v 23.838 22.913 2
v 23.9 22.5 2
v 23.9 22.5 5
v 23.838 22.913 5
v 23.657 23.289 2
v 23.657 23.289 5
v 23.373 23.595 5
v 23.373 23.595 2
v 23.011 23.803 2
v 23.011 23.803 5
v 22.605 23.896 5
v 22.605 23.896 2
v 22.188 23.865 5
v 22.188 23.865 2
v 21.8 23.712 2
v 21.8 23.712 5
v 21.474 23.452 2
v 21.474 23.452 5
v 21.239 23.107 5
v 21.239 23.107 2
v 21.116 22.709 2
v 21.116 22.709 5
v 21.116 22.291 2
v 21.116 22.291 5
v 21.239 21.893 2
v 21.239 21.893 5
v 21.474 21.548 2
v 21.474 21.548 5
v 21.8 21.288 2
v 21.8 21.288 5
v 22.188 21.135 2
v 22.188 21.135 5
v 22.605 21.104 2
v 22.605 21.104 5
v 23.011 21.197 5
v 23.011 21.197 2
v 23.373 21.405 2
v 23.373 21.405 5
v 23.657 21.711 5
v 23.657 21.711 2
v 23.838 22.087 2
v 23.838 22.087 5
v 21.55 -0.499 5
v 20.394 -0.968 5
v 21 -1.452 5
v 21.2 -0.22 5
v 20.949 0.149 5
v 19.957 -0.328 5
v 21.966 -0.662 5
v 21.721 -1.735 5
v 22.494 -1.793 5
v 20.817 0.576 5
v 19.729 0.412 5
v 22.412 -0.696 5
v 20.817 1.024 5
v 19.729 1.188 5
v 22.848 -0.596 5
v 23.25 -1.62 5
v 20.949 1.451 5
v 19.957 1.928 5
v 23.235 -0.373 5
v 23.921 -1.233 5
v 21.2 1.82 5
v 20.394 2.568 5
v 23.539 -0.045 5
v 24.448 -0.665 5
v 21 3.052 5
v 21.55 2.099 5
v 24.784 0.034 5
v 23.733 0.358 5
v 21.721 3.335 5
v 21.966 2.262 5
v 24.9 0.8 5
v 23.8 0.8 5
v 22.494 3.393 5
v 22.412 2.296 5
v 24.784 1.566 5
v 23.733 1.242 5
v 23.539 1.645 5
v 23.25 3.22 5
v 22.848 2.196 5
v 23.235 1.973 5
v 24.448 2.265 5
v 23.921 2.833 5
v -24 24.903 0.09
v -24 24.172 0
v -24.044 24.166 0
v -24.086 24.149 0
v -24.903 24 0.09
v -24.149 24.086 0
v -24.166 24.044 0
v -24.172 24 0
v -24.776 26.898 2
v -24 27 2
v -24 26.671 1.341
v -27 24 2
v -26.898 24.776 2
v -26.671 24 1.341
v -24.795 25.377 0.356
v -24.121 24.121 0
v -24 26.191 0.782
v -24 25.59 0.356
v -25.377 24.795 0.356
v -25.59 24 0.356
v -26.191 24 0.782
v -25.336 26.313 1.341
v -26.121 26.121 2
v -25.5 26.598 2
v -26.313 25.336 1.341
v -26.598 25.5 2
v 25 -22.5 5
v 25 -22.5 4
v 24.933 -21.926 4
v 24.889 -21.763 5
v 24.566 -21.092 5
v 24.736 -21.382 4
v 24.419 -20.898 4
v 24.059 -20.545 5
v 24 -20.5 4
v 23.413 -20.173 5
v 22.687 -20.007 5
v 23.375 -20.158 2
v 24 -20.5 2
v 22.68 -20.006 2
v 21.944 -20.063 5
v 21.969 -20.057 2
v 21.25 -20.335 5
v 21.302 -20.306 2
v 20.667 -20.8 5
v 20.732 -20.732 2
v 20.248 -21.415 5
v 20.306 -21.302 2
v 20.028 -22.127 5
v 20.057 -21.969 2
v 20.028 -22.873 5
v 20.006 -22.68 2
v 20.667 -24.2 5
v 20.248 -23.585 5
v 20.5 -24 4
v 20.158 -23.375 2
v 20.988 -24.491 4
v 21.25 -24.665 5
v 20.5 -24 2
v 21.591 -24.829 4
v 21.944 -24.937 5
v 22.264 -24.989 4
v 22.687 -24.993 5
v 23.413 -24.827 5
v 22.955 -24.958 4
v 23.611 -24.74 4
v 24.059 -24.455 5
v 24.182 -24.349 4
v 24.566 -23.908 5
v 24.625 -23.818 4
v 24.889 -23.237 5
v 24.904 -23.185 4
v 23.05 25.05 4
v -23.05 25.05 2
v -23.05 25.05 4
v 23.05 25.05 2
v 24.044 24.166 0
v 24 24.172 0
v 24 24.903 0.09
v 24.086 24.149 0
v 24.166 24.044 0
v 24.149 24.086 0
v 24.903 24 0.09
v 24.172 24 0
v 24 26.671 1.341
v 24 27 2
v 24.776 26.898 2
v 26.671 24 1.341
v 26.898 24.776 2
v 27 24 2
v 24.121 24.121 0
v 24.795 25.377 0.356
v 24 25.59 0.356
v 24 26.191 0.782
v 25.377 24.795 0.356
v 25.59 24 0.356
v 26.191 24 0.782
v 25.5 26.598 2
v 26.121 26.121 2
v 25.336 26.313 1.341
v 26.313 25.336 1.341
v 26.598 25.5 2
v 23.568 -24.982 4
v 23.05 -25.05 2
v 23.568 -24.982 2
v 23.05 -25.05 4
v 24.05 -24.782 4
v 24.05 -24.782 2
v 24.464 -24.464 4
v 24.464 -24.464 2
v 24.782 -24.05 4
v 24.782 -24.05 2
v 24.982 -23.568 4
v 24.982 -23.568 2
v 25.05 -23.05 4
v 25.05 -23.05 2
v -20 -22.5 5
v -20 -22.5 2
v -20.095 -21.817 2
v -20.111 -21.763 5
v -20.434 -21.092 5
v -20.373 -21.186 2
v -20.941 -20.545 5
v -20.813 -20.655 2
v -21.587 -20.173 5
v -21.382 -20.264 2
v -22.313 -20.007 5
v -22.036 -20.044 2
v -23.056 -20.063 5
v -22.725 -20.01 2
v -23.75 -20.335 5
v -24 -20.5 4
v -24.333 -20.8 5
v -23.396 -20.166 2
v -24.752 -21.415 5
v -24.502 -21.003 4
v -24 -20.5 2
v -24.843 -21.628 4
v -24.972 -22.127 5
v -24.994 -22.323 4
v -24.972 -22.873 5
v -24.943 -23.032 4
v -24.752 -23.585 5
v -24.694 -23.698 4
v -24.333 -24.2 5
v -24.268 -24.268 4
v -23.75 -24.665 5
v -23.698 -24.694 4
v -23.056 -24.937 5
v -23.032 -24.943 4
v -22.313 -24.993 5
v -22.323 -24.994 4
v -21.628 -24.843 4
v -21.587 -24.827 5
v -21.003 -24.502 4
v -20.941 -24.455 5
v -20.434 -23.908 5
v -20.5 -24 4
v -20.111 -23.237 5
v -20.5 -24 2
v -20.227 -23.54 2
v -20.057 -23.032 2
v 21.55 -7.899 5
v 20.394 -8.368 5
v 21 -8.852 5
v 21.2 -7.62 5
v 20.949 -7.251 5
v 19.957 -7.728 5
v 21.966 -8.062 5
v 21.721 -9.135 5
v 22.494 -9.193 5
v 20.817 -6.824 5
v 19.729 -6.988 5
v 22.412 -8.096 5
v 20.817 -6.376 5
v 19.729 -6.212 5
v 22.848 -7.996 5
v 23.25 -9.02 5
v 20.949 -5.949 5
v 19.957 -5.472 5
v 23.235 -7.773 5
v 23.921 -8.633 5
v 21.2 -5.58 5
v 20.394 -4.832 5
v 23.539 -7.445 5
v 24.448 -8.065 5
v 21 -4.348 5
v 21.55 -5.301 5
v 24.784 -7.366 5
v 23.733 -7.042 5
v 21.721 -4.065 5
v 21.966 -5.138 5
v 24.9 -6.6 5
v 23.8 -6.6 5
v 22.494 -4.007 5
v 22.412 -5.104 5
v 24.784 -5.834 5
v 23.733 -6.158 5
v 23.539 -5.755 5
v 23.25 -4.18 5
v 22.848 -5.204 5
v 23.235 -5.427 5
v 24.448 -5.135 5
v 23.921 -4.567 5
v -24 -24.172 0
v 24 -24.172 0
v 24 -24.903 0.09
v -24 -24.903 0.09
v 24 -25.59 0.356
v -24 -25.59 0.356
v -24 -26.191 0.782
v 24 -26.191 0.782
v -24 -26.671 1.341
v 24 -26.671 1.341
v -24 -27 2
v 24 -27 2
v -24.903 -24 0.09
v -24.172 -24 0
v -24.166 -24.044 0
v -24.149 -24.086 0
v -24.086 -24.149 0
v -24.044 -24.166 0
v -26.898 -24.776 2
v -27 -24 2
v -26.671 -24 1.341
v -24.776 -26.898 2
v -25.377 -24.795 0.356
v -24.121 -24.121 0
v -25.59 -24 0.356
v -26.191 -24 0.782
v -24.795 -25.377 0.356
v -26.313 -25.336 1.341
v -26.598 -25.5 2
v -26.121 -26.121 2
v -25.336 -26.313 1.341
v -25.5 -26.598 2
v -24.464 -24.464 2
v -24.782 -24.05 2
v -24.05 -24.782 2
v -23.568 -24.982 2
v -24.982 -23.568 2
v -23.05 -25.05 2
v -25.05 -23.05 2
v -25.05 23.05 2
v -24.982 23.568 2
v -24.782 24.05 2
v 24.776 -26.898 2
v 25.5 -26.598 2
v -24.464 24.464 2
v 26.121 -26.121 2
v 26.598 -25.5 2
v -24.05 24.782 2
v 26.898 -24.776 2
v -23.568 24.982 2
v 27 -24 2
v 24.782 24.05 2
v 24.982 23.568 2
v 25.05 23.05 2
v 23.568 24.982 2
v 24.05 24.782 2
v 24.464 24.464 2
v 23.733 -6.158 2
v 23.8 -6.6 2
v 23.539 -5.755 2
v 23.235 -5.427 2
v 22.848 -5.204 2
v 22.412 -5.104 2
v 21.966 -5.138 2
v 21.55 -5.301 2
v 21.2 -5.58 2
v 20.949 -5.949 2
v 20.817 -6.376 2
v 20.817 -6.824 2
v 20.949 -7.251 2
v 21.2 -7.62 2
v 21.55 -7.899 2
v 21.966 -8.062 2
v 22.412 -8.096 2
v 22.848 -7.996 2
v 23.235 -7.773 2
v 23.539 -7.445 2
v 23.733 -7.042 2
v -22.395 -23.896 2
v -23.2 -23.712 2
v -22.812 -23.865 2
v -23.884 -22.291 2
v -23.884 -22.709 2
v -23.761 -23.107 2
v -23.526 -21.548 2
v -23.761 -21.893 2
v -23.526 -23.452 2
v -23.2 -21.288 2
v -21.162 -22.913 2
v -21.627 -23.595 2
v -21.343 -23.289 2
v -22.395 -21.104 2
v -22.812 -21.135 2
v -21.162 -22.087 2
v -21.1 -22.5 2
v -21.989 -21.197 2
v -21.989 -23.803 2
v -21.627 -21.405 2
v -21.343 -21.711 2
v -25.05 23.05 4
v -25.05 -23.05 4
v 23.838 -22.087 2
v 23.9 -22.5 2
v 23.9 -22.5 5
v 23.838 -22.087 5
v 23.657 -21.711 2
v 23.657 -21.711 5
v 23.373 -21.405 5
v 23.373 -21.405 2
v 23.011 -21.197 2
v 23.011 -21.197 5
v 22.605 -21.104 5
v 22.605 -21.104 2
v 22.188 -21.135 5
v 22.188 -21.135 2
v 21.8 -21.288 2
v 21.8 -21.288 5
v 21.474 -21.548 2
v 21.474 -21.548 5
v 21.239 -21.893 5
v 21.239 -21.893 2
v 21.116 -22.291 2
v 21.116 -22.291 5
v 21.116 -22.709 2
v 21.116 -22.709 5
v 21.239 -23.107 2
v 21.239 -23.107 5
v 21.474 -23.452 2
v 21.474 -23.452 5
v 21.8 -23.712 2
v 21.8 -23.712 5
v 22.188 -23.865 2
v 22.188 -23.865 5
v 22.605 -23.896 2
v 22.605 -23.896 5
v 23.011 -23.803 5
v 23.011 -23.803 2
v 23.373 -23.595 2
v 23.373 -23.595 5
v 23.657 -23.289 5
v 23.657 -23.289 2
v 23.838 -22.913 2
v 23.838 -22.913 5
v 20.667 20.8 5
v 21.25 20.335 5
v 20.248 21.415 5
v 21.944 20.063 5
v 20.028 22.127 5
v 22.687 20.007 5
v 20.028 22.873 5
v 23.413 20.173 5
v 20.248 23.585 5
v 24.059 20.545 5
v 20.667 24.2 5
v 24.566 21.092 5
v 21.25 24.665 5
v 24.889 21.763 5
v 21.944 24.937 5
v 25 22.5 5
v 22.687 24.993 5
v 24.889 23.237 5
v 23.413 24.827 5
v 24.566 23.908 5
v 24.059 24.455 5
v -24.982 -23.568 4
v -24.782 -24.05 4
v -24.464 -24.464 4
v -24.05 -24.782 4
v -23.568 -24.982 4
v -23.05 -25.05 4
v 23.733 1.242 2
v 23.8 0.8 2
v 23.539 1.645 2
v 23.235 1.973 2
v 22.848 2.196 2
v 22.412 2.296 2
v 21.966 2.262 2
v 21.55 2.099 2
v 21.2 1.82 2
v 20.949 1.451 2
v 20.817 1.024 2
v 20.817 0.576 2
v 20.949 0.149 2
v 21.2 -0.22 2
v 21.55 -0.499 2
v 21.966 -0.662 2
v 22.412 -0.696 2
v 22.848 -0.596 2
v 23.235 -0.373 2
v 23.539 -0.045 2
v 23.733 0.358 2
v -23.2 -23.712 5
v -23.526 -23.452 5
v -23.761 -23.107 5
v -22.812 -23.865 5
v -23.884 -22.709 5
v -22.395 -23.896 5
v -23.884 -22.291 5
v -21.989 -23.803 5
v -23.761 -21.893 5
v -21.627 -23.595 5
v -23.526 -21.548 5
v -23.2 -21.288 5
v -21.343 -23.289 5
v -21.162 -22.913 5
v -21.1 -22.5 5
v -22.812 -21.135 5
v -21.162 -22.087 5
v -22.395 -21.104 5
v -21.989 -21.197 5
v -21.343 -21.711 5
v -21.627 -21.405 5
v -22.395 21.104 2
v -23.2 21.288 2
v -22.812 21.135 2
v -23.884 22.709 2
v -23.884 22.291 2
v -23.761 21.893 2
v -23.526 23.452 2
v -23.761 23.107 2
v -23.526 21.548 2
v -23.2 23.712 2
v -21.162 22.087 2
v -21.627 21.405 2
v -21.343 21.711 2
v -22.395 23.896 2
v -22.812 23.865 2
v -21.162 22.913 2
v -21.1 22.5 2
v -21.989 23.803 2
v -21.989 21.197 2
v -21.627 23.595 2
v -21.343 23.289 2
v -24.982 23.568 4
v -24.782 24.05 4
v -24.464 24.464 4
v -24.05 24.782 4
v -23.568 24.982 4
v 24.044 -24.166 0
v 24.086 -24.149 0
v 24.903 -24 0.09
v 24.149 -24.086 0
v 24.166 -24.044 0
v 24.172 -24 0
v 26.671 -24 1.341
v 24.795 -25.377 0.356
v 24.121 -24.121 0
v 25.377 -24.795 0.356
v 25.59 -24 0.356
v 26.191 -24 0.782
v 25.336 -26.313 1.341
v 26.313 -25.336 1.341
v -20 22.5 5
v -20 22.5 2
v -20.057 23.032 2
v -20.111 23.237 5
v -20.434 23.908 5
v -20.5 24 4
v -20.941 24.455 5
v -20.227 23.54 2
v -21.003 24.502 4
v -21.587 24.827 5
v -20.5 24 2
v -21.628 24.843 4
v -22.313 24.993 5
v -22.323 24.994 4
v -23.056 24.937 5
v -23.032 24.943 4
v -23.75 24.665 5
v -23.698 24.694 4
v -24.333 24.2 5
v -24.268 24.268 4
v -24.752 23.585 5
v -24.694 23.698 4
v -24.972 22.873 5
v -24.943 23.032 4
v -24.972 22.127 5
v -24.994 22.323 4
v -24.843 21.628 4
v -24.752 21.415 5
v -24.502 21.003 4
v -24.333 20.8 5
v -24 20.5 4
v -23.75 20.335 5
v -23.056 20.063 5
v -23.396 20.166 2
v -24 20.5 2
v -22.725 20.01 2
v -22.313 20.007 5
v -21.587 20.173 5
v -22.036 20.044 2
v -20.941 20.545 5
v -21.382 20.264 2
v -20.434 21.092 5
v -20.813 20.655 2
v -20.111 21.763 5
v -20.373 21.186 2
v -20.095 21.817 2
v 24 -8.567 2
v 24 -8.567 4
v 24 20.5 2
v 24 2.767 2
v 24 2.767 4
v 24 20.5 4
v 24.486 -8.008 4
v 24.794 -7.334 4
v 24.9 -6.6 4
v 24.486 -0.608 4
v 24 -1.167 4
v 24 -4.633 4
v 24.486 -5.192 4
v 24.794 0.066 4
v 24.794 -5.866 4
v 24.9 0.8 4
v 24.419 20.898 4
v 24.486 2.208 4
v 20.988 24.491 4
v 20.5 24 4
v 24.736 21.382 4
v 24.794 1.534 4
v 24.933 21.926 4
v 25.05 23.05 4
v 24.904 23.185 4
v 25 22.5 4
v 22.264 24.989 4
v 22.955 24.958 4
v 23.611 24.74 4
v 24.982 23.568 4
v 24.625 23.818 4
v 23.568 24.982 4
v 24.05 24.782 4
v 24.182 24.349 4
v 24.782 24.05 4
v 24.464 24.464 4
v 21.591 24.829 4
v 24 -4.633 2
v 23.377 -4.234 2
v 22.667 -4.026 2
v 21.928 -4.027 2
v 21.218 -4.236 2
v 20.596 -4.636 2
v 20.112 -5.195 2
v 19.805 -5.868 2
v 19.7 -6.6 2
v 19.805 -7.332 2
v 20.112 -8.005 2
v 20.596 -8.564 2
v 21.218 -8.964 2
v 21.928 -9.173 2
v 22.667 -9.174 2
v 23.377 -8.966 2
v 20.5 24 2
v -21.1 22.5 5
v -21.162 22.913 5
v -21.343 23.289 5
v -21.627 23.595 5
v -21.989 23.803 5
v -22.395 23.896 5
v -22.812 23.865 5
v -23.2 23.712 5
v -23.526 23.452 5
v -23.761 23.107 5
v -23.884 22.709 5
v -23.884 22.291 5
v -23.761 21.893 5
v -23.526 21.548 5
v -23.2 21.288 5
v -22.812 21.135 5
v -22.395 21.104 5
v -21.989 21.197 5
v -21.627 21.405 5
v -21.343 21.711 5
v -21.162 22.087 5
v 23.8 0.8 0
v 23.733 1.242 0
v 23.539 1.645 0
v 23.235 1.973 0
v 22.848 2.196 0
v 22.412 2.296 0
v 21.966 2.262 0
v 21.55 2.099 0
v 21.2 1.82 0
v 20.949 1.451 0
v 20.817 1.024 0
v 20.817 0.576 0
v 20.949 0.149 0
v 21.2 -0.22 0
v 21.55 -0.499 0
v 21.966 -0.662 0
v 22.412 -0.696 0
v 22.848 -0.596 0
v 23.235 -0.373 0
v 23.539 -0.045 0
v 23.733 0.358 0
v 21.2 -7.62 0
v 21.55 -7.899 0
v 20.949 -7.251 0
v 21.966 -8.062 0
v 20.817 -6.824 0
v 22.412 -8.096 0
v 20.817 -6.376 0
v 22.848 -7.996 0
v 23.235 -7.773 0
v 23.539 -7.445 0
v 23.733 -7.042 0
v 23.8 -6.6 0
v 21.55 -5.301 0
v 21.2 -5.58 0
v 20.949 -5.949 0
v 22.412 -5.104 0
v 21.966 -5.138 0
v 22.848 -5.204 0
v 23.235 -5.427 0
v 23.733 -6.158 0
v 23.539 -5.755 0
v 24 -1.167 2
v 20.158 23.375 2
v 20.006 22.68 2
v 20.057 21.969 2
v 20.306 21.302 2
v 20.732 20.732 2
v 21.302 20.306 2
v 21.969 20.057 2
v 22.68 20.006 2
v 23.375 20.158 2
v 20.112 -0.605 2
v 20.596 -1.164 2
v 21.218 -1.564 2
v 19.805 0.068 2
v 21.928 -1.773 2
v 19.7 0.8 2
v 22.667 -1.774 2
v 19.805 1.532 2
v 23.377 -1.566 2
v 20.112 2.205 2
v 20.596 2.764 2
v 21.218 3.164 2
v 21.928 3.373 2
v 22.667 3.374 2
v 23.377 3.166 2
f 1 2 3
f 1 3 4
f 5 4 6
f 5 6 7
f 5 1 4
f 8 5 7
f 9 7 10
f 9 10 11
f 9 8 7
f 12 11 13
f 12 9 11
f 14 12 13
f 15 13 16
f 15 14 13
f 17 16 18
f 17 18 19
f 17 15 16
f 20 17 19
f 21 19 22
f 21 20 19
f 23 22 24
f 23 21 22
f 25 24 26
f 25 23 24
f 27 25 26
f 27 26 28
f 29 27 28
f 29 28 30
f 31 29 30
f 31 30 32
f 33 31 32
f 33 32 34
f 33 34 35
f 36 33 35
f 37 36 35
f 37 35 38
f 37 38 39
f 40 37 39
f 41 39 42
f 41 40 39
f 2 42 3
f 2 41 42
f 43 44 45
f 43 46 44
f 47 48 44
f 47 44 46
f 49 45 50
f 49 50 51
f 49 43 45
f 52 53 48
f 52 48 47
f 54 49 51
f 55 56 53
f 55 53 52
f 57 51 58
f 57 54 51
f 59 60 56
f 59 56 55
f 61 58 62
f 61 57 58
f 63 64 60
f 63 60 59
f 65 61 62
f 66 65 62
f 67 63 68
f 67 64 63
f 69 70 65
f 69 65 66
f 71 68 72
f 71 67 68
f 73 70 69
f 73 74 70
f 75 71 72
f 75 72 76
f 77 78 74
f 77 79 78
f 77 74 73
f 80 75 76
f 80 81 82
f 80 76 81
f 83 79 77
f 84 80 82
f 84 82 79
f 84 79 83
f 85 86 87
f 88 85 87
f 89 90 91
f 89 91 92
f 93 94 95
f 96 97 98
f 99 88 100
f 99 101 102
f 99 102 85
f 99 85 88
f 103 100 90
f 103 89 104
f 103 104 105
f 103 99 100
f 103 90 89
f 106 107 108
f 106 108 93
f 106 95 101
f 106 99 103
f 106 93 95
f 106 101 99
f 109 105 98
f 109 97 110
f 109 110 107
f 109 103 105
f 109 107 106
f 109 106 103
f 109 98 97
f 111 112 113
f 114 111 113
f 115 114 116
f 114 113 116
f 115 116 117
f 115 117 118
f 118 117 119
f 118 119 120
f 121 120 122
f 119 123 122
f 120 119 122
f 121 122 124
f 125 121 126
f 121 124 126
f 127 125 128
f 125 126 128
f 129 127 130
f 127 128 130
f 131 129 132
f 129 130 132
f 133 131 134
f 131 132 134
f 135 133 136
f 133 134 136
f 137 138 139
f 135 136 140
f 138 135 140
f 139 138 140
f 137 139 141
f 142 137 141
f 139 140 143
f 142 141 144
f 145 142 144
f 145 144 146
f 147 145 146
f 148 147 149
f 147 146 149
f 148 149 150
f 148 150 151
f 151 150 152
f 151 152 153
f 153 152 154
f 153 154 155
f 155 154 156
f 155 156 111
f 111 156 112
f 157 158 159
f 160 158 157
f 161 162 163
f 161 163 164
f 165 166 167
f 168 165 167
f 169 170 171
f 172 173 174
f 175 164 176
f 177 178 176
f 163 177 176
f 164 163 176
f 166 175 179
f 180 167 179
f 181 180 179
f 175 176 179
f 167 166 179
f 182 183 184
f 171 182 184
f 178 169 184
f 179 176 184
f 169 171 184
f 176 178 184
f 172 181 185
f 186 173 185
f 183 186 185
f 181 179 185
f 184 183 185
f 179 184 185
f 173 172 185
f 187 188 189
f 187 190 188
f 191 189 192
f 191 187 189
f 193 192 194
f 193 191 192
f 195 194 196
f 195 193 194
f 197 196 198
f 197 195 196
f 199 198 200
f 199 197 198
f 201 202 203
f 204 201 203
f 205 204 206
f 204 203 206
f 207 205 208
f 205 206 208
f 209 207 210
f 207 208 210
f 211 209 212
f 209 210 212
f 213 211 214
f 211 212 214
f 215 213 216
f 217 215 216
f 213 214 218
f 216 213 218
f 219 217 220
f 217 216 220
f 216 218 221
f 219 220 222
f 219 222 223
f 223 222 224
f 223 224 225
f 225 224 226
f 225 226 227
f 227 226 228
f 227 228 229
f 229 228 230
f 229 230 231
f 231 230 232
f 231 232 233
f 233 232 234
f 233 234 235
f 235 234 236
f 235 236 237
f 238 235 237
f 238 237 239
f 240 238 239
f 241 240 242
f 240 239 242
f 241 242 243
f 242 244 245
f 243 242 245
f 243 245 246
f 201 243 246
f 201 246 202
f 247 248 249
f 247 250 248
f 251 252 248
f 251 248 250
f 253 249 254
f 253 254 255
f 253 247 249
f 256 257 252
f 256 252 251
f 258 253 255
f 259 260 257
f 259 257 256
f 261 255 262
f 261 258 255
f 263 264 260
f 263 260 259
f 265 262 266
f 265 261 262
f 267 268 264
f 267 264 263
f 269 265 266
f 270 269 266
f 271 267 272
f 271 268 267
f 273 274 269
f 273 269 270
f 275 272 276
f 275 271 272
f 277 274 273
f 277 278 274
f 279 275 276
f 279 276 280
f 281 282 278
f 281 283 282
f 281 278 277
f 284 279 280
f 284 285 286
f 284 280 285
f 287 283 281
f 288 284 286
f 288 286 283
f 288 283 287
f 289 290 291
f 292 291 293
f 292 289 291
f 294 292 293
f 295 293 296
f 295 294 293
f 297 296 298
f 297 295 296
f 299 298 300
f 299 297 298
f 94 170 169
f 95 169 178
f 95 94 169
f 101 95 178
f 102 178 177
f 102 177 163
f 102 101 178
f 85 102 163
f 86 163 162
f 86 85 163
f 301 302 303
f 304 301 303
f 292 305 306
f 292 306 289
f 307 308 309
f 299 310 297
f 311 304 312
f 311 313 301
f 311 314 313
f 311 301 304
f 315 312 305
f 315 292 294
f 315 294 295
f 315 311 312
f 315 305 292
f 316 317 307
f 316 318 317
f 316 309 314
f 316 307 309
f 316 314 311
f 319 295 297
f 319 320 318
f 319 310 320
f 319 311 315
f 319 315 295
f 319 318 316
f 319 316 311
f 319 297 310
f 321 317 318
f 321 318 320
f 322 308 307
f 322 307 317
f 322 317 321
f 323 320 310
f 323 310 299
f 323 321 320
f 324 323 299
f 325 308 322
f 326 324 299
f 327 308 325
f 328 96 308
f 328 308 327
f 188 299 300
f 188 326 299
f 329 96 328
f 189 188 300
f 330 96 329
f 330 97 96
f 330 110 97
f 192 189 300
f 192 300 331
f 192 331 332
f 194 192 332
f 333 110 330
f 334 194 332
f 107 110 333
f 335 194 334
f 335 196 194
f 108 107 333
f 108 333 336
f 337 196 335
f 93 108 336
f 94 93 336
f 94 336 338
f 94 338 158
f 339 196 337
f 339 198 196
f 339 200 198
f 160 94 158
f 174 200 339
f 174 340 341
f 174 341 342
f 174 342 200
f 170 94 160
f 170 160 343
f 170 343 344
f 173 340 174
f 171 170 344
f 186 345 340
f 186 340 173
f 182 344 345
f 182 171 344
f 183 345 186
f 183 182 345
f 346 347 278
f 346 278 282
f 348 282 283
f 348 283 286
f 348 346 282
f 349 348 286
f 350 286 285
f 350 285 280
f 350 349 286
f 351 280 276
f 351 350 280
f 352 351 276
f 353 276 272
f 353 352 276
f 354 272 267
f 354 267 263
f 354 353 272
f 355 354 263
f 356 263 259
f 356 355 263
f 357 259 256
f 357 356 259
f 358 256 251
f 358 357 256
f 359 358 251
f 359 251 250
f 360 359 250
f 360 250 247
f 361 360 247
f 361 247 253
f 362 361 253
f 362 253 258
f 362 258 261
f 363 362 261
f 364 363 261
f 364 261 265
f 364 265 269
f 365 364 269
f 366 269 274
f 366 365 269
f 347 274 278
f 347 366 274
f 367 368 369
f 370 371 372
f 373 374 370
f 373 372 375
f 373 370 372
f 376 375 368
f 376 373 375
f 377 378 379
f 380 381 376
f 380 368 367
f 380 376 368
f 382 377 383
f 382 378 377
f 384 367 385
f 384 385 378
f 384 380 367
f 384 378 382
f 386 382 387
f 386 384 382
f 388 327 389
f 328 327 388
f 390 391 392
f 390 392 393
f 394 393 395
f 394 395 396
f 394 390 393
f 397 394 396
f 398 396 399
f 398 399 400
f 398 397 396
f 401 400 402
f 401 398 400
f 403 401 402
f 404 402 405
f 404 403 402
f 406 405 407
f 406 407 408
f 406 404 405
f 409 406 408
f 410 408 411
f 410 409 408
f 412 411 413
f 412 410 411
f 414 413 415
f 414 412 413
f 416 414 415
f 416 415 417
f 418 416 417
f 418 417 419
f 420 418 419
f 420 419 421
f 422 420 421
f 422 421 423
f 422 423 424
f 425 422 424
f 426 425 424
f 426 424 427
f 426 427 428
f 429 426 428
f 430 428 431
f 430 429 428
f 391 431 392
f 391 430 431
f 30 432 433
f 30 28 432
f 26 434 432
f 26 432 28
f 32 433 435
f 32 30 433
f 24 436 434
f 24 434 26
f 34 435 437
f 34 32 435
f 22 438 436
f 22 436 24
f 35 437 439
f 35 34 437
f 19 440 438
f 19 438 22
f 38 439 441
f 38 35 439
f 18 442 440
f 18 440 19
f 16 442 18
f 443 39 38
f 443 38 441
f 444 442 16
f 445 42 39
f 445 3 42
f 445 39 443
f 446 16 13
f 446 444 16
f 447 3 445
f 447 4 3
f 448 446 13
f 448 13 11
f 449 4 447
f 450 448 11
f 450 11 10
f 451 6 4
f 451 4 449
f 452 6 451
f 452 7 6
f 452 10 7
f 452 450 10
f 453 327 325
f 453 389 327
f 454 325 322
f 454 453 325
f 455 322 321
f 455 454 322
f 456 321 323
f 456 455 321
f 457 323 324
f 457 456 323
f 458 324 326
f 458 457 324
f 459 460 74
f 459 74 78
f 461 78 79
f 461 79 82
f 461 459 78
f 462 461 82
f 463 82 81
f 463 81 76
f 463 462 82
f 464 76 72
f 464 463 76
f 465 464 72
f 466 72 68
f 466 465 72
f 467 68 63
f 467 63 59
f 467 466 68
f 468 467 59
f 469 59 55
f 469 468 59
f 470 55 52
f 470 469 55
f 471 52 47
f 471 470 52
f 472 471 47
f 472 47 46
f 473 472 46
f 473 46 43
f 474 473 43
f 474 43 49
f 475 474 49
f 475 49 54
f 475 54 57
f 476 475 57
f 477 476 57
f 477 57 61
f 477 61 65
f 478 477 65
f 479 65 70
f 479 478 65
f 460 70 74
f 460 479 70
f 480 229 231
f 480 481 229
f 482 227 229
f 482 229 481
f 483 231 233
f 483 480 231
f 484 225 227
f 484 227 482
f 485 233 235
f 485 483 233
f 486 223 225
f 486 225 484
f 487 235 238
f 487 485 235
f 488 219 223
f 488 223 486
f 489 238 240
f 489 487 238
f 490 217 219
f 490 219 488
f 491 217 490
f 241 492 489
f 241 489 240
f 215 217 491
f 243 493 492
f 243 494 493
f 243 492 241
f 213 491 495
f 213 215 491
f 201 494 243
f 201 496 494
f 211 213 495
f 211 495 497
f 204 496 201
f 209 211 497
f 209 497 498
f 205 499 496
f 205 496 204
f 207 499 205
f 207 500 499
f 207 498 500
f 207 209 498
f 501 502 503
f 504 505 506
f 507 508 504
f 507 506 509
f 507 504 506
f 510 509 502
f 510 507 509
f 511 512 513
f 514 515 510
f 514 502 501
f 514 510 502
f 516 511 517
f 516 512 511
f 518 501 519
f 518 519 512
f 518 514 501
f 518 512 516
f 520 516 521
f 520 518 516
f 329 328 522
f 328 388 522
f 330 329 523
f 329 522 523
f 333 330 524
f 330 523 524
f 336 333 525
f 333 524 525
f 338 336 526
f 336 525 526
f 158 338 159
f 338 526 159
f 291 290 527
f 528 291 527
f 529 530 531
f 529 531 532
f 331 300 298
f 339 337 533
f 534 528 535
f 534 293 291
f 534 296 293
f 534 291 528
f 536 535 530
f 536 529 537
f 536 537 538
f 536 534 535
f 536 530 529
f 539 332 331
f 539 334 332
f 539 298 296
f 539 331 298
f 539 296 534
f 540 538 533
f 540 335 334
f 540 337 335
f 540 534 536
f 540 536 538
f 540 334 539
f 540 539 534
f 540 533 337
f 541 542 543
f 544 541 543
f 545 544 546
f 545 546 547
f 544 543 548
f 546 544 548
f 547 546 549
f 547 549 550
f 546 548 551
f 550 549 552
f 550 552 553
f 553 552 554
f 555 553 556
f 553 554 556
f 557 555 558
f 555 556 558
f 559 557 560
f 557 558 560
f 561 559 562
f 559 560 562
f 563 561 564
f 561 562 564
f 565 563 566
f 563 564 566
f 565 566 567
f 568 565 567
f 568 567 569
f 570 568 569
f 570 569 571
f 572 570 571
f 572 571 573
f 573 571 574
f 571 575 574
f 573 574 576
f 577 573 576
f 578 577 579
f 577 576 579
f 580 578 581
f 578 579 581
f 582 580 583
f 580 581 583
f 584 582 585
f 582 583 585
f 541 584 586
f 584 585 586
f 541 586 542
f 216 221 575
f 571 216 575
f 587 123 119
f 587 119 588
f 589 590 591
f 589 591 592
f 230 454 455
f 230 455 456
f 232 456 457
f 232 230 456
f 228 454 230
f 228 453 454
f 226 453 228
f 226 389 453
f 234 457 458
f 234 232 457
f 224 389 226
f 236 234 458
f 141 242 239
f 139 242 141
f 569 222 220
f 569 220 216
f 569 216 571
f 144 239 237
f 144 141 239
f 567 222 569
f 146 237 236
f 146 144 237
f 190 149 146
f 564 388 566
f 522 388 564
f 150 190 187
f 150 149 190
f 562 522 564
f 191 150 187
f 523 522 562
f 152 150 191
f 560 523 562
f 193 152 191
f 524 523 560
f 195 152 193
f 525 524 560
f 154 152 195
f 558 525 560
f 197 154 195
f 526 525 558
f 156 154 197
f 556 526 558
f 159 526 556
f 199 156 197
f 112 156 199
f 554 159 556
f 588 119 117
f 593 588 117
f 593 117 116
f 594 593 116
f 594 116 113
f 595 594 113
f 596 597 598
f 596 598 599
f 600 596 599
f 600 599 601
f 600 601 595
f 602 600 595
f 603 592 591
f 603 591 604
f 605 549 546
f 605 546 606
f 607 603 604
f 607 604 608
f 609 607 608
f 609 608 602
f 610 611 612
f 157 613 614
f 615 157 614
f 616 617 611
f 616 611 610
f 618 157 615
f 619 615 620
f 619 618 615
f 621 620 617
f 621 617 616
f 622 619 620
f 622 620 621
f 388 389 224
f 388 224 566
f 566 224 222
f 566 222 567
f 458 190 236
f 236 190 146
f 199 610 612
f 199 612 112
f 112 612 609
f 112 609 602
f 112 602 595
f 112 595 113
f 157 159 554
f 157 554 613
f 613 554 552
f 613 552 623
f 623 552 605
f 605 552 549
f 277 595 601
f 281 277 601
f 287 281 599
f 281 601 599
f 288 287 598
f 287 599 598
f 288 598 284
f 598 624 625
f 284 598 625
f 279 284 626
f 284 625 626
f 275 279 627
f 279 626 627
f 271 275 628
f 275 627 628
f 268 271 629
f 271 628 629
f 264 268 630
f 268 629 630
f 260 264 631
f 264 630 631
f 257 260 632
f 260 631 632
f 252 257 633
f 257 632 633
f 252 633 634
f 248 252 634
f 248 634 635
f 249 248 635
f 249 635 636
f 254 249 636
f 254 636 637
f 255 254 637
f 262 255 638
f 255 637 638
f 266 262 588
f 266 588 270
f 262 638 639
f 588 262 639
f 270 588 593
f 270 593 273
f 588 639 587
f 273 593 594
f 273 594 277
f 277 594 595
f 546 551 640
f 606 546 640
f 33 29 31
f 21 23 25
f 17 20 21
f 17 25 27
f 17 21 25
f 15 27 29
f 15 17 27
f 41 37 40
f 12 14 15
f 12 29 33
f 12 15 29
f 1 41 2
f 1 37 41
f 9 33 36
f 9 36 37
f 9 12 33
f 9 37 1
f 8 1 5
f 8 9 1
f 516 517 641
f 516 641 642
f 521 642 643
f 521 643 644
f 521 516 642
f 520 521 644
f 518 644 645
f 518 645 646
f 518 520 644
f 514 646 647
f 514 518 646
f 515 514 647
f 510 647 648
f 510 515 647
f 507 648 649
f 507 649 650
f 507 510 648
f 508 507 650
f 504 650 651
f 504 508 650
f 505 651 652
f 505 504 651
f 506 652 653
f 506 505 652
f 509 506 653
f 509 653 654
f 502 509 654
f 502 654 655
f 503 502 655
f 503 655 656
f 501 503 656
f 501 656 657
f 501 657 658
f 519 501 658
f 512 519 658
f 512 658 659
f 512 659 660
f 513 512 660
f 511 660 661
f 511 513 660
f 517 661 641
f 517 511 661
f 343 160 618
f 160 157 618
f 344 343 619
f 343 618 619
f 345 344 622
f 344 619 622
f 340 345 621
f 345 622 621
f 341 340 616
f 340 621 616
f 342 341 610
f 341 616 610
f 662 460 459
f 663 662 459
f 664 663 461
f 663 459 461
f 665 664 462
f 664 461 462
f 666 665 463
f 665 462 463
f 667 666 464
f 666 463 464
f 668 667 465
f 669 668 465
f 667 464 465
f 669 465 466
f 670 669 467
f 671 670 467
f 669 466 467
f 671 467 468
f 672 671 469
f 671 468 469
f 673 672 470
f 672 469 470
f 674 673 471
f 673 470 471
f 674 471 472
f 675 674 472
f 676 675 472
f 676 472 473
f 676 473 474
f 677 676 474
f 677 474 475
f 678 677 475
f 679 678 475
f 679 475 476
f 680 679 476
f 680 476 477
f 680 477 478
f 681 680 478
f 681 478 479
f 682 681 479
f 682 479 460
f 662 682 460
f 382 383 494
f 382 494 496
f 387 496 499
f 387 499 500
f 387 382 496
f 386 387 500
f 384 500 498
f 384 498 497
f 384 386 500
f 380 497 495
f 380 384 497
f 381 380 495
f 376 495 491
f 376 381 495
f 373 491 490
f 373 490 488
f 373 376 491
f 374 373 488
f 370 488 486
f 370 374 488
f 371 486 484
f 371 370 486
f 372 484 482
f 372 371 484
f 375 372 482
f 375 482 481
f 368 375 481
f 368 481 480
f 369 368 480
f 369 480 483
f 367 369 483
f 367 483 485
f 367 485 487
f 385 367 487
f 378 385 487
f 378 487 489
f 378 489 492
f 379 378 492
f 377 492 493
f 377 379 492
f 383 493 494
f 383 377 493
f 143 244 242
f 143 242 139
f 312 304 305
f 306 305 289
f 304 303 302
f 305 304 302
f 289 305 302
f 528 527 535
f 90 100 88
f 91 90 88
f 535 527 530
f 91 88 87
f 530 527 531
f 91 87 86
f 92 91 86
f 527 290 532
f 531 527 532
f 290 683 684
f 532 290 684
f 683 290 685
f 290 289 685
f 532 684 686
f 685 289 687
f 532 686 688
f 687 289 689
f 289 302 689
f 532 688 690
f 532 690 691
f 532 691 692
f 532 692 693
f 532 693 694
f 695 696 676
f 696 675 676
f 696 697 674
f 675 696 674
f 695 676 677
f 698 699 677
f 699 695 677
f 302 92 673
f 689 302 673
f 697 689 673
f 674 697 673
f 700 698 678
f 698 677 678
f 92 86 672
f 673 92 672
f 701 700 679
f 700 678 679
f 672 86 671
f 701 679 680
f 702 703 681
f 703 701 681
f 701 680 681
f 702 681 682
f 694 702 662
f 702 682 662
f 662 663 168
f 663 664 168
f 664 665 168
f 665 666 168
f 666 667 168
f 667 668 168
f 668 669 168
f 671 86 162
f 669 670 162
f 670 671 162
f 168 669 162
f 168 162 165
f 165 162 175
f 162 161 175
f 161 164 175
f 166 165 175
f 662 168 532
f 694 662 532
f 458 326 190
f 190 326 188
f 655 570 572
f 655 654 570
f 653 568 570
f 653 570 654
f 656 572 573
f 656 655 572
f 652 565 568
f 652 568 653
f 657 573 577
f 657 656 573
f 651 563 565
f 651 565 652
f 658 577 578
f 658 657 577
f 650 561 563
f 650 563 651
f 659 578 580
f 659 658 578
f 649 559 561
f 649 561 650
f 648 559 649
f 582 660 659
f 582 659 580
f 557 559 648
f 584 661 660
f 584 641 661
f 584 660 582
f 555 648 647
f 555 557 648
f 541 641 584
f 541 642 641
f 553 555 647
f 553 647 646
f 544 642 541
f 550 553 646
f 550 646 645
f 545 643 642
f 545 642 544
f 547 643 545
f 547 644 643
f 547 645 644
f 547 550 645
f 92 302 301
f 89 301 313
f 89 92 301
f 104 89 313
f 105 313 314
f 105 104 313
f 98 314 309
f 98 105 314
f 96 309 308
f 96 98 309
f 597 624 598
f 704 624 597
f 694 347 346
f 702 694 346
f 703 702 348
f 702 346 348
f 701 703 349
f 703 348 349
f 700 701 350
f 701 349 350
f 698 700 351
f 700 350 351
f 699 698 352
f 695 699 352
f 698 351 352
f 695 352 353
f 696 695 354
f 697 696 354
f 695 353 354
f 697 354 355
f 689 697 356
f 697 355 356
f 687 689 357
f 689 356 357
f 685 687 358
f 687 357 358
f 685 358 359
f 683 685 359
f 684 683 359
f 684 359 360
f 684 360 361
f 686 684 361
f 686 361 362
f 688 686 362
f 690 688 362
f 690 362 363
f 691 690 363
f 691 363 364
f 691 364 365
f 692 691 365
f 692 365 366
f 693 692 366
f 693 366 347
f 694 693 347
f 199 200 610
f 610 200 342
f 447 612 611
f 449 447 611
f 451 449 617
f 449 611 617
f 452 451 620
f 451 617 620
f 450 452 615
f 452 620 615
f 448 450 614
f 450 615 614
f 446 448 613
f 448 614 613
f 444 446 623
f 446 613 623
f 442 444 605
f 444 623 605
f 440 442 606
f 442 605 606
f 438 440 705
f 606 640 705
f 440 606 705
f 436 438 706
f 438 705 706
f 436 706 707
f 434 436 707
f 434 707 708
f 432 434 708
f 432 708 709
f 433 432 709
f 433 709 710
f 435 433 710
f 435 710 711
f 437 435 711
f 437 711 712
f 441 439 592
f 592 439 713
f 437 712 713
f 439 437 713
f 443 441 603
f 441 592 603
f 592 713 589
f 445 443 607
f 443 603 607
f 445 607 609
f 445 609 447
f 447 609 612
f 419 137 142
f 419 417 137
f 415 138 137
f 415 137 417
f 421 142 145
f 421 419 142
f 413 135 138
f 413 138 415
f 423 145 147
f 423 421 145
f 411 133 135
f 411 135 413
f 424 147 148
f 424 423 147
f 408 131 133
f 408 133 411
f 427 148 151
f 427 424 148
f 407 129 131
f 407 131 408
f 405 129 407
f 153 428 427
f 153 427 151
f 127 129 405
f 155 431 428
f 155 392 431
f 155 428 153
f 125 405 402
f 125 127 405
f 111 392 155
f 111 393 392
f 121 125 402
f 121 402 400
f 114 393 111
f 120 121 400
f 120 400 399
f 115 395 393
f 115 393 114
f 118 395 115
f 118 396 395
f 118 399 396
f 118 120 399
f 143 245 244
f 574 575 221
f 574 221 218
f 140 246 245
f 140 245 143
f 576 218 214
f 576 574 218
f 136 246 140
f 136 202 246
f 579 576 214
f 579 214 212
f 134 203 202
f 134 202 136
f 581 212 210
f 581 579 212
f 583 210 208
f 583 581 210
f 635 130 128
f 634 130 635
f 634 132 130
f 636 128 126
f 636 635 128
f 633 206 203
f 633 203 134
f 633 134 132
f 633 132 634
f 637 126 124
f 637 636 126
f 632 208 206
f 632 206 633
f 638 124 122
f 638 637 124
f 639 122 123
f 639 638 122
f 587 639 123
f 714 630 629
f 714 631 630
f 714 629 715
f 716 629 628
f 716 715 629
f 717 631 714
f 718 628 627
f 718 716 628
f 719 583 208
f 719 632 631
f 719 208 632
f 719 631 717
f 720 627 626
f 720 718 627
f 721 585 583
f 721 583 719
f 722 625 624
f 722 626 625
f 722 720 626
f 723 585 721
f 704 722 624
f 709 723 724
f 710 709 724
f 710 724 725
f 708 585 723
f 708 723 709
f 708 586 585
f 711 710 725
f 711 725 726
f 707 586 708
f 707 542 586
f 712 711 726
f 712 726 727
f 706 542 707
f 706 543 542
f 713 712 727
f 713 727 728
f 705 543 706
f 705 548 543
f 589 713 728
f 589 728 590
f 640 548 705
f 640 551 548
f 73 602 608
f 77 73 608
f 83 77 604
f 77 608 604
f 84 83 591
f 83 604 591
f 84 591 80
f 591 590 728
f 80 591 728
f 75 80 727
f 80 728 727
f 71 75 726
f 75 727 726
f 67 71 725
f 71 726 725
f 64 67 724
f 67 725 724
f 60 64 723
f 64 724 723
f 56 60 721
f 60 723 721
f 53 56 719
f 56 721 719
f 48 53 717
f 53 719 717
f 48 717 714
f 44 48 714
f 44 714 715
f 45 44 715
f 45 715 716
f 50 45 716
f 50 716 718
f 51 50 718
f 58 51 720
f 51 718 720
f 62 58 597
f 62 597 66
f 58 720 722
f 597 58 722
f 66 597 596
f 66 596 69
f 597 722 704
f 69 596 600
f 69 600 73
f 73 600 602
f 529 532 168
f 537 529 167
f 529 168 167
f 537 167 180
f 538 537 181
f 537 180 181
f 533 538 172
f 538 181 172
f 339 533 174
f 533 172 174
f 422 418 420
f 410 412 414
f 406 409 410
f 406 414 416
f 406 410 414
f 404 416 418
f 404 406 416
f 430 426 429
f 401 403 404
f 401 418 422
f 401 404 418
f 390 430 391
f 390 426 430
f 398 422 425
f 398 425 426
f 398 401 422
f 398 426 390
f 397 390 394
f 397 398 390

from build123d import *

# Parameters (mm, degrees)
F0_W         = 54
F0_H         = 54
F1_DEPTH     = 2
F2_R         = 3
F3_T1_DEPTH  = 48
F3_T3_DEPTH  = 48
F3_T6_ANGLE  = 90
F3_T8_ANGLE  = 90
F3_T10_ANGLE = 90
F3_T12_ANGLE = 90
F4_W         = 50.1
F4_H         = 50.1
F4_W_2       = 48
F4_H_2       = 48
F5_DEPTH     = 2
F6_R         = 2.5
F6_R_2       = 1.4
F7_DEPTH     = 3
F8_R         = 2
F9_R         = 2.6
F9_R_2       = 1.5
F10_DEPTH    = 3
F11_R        = 1.5
F12_DEPTH    = 25


# Not quite as in the source:
# - a fillet or chamfer that OpenCascade refuses, or shapes differently, is made with other operations: its cross-section is extruded or revolved along the edge and cut away or added


with BuildPart() as f1:
    # F0 (on Top) → F1 (new body)
    with BuildSketch(Plane.XY):
        Rectangle(F0_W, F0_H)
    extrude(amount=F1_DEPTH)

    # F2
    f2_edges = [f1.edges().sort_by_distance(p)[0] for p in [
        (-27, -27, 1),
        (-27, 27, 1),
        (27, 27, 1),
        (27, -27, 1),
    ]]
    fillet(f2_edges, radius=F2_R)

    # F3: fillet of radius 3 on 8 edges, made by hand

    # F3_s2 → F3_t1 (cut)
    with BuildSketch(Plane.YZ.offset(-24)):
        with BuildLine():
            ThreePointArc((27, 2), (25.9036236828, 0.5505102572), (24.1715728753, 0))
            Line((24.1715728753, 0), (27, 0))
            Line((27, 0), (27, 2))
        make_face()
        with BuildLine():
            ThreePointArc((-24.1715728753, 0), (-25.9036236828, 0.5505102572), (-27, 2))
            Line((-27, 2), (-27, 0))
            Line((-27, 0), (-24.1715728753, 0))
        make_face()
    extrude(amount=F3_T1_DEPTH, mode=Mode.SUBTRACT)

    # F3_s4 → F3_t3 (cut)
    with BuildSketch(Plane.XZ.offset(-24)):
        with BuildLine():
            ThreePointArc((24.1715728753, 0), (25.9036236828, 0.5505102572), (27, 2))
            Line((27, 2), (27, 0))
            Line((27, 0), (24.1715728753, 0))
        make_face()
        with BuildLine():
            ThreePointArc((-24.1715728753, 0), (-25.9036236828, 0.5505102572), (-27, 2))
            Line((-27, 2), (-27, 0))
            Line((-27, 0), (-24.1715728753, 0))
        make_face()
    extrude(amount=F3_T3_DEPTH, mode=Mode.SUBTRACT)

    # F3_s5 → F3_t6 (revolve, cut)
    with BuildSketch(Plane.YZ.offset(24)):
        with BuildLine():
            ThreePointArc((24.1715728753, 0), (25.9036236828, 0.5505102572), (27, 2))
            Line((27, 2), (27, 0))
            Line((27, 0), (24.1715728753, 0))
        make_face()
    revolve(axis=Axis((24, 24, 0), (0, 0, -1)), revolution_arc=F3_T6_ANGLE, mode=Mode.SUBTRACT)

    # F3_s7 → F3_t8 (revolve, cut)
    with BuildSketch(Plane.YZ.offset(-24)):
        with BuildLine():
            ThreePointArc((24.1715728753, 0), (25.9036236828, 0.5505102572), (27, 2))
            Line((27, 2), (27, 0))
            Line((27, 0), (24.1715728753, 0))
        make_face()
    revolve(axis=Axis((-24, 24, 0), (0, 0, 1)), revolution_arc=F3_T8_ANGLE, mode=Mode.SUBTRACT)

    # F3_s9 → F3_t10 (revolve, cut)
    with BuildSketch(Plane.YZ.offset(24)):
        with BuildLine():
            ThreePointArc((-24.1715728753, 0), (-25.9036236828, 0.5505102572), (-27, 2))
            Line((-27, 2), (-27, 0))
            Line((-27, 0), (-24.1715728753, 0))
        make_face()
    revolve(axis=Axis((24, -24, 0), (0, 0, 1)), revolution_arc=F3_T10_ANGLE, mode=Mode.SUBTRACT)

    # F3_s11 → F3_t12 (revolve, cut)
    with BuildSketch(Plane.XZ.offset(24)):
        with BuildLine():
            ThreePointArc((-24.1715728753, 0), (-25.9036236828, 0.5505102572), (-27, 2))
            Line((-27, 2), (-27, 0))
            Line((-27, 0), (-24.1715728753, 0))
        make_face()
    revolve(axis=Axis((-24, -24, 0), (0, 0, 1)), revolution_arc=F3_T12_ANGLE, mode=Mode.SUBTRACT)

    # F4 (on face) → F5 (join)
    with BuildSketch(Plane.XY.offset(2)):
        Rectangle(F4_W, F4_H)
        Rectangle(F4_W_2, F4_H_2, mode=Mode.SUBTRACT)
    extrude(amount=F5_DEPTH)

    # F6 (on face) → F7 (join)
    with BuildSketch(Plane.XY.offset(2)):
        with Locations((-22.5, 22.5)):
            Circle(F6_R)
        with Locations((-22.5, 22.5)):
            Circle(F6_R_2, mode=Mode.SUBTRACT)
        with Locations((22.5, 22.5)):
            Circle(F6_R)
        with Locations((22.5, 22.5)):
            Circle(F6_R_2, mode=Mode.SUBTRACT)
        with Locations((22.5, -22.5)):
            Circle(F6_R)
        with Locations((22.5, -22.5)):
            Circle(F6_R_2, mode=Mode.SUBTRACT)
        with Locations((-22.5, -22.5)):
            Circle(F6_R)
        with Locations((-22.5, -22.5)):
            Circle(F6_R_2, mode=Mode.SUBTRACT)
    extrude(amount=F7_DEPTH)

    # F8
    f8_edges = [f1.edges().sort_by_distance(p)[0] for p in [
        (-25.05, -25.05, 3),
        (25.05, -25.05, 3),
        (25.05, 25.05, 3),
        (-25.05, 25.05, 3),
    ]]
    fillet(f8_edges, radius=F8_R)

    # F9 (on face) → F10 (join)
    with BuildSketch(Plane.XY.offset(2)):
        with Locations((22.3, 0.8)):
            Circle(F9_R)
        with Locations((22.3, 0.8)):
            Circle(F9_R_2, mode=Mode.SUBTRACT)
        with Locations((22.3, -6.6)):
            Circle(F9_R)
        with Locations((22.3, -6.6)):
            Circle(F9_R_2, mode=Mode.SUBTRACT)
    extrude(amount=F10_DEPTH)

    # F11 (on face) → F12 (cut)
    with BuildSketch(Plane.XY.offset(2)):
        with Locations((22.3, 0.8)):
            Circle(F11_R)
        with Locations((22.3, -6.6)):
            Circle(F11_R)
    extrude(amount=-F12_DEPTH, mode=Mode.SUBTRACT)


solid = f1.part
